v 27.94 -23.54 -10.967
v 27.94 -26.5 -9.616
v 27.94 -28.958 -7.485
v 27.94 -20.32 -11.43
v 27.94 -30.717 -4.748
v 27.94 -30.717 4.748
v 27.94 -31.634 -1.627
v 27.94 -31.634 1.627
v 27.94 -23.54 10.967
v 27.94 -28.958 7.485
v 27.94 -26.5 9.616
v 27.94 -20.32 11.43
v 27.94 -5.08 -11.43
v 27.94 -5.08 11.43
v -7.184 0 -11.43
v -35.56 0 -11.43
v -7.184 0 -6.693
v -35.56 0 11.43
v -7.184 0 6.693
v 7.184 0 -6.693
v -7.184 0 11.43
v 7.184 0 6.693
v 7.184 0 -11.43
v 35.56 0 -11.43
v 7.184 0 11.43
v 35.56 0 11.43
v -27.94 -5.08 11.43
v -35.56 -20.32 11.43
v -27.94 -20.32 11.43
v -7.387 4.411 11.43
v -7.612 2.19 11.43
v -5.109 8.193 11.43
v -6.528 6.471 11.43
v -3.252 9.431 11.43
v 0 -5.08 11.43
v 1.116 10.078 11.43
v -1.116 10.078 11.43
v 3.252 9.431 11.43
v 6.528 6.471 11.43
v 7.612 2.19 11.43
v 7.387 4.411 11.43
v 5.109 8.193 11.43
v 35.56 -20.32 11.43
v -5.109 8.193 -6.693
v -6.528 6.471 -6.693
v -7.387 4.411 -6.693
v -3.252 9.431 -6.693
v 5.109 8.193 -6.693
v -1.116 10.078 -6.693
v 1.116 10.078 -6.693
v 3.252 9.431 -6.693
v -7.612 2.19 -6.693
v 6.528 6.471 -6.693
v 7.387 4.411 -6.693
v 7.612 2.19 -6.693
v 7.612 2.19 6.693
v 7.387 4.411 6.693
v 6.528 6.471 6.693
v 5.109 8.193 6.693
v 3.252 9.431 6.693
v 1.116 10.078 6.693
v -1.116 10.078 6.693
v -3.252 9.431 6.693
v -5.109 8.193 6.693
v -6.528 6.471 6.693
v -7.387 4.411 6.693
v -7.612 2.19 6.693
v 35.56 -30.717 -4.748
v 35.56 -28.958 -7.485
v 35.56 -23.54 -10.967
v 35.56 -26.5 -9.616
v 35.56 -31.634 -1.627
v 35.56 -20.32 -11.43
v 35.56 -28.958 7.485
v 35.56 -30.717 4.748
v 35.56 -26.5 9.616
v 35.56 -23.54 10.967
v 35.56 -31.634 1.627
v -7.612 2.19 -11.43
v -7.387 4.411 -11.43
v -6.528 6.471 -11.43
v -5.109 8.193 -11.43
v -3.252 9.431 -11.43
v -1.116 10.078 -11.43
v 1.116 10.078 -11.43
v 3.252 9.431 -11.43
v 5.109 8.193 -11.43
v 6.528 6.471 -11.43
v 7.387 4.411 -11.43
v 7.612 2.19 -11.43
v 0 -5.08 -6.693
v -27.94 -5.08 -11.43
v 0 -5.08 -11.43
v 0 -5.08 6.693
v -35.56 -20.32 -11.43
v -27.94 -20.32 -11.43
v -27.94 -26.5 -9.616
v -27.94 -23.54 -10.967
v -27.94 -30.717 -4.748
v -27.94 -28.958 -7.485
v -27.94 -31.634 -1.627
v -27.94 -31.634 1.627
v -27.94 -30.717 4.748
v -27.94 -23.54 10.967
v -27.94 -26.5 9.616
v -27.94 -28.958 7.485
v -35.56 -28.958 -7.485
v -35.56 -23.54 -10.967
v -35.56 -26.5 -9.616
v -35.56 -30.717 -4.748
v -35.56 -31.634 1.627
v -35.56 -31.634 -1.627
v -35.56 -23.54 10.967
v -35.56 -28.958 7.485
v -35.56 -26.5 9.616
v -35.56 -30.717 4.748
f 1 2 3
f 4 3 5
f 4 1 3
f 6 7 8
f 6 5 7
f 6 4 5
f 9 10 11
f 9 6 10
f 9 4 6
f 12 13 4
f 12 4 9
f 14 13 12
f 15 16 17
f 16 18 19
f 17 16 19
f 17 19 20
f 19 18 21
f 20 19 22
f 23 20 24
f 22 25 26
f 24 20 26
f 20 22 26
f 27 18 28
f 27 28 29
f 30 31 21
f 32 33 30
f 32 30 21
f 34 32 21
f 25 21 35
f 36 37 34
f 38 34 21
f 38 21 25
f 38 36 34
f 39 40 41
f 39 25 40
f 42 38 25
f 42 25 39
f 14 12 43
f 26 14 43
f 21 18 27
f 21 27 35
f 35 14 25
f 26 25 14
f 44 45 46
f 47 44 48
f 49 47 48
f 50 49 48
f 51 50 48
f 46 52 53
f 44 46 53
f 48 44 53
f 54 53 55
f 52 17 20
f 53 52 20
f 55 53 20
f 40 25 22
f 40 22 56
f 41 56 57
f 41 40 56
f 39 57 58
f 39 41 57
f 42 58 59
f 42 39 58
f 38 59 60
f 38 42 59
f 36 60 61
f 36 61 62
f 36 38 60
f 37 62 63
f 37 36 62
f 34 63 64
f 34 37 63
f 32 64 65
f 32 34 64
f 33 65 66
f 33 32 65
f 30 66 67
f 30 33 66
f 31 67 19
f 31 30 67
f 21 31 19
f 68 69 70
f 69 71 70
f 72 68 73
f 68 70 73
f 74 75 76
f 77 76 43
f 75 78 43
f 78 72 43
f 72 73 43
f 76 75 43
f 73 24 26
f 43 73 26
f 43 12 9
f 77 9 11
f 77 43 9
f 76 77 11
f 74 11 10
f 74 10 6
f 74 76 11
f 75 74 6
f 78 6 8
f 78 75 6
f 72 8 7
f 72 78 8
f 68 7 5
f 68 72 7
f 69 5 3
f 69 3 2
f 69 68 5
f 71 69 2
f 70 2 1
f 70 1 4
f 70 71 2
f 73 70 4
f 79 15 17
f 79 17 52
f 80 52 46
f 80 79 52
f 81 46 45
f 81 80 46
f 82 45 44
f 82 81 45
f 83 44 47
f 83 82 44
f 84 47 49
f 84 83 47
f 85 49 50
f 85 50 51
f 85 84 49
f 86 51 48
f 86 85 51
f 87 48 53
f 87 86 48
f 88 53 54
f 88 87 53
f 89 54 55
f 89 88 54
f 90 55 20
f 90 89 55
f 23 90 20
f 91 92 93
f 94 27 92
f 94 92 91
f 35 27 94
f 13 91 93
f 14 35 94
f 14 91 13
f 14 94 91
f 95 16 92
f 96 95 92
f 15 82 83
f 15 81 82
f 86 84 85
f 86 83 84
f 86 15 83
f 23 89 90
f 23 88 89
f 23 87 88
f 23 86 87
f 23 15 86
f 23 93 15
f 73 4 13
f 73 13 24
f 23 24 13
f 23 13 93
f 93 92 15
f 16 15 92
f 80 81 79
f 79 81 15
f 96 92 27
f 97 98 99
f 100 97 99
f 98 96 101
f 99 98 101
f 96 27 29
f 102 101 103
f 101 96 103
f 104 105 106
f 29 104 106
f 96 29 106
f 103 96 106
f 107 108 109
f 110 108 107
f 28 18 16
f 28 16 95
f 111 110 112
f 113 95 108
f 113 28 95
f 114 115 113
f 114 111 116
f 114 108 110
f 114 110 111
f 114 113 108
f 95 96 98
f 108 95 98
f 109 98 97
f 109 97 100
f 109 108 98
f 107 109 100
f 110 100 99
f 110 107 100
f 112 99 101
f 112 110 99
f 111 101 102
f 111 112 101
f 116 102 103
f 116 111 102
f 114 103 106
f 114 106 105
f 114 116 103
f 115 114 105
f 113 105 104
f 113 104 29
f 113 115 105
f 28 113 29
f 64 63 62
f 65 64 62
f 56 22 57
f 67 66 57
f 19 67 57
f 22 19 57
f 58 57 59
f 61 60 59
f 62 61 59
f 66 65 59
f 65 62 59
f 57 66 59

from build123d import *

# Parameters (mm, degrees)
F0_W      = 71.12
F0_H      = 22.86
F1_DEPTH  = 5.08
F2_W      = 7.62
F2_H      = 22.86
F3_DEPTH  = 15.24
F4_R      = 11.43
F5_DEPTH  = 7.62
F6_R      = 11.43
F7_DEPTH  = 7.62
F8_R      = 7.62
F9_DEPTH  = 4.7371
F10_R     = 7.62
F11_DEPTH = 4.7371


with BuildPart() as f1:
    # F0 (on Front) → F1 (new body)
    with BuildSketch(Plane.XZ):
        Rectangle(F0_W, F0_H)
    extrude(amount=F1_DEPTH)

    # F2 (on face) → F3 (join)
    with BuildSketch(Plane.XZ.offset(5.08)):
        with Locations((-31.75, 0)):
            Rectangle(F2_W, F2_H)
        with Locations((31.75, 0)):
            Rectangle(F2_W, F2_H)
    extrude(amount=F3_DEPTH)

    # F4 (on face) → F5 (join)
    with BuildSketch(Plane.YZ.offset(35.56)):
        with Locations((-20.32, 0)):
            Circle(F4_R)
    extrude(amount=-F5_DEPTH)

    # F6 (on face) → F7 (join)
    with BuildSketch(Plane(origin=(-35.56, 0, 0), x_dir=(0, -1, 0), z_dir=(-1, 0, 0))):
        with Locations((20.32, 0)):
            Circle(F6_R)
    extrude(amount=-F7_DEPTH)

    # F8 (on face) → F9 (join)
    with BuildSketch(Plane.XY.offset(11.43)):
        with Locations((0, 2.54)):
            Circle(F8_R)
    extrude(amount=-F9_DEPTH)

    # F10 (on face) → F11 (join)
    with BuildSketch(Plane(origin=(0, 0, -11.43), x_dir=(1, 0, 0), z_dir=(0, 0, -1))):
        with Locations((0, -2.54)):
            Circle(F10_R)
    extrude(amount=-F11_DEPTH)


solid = f1.part
